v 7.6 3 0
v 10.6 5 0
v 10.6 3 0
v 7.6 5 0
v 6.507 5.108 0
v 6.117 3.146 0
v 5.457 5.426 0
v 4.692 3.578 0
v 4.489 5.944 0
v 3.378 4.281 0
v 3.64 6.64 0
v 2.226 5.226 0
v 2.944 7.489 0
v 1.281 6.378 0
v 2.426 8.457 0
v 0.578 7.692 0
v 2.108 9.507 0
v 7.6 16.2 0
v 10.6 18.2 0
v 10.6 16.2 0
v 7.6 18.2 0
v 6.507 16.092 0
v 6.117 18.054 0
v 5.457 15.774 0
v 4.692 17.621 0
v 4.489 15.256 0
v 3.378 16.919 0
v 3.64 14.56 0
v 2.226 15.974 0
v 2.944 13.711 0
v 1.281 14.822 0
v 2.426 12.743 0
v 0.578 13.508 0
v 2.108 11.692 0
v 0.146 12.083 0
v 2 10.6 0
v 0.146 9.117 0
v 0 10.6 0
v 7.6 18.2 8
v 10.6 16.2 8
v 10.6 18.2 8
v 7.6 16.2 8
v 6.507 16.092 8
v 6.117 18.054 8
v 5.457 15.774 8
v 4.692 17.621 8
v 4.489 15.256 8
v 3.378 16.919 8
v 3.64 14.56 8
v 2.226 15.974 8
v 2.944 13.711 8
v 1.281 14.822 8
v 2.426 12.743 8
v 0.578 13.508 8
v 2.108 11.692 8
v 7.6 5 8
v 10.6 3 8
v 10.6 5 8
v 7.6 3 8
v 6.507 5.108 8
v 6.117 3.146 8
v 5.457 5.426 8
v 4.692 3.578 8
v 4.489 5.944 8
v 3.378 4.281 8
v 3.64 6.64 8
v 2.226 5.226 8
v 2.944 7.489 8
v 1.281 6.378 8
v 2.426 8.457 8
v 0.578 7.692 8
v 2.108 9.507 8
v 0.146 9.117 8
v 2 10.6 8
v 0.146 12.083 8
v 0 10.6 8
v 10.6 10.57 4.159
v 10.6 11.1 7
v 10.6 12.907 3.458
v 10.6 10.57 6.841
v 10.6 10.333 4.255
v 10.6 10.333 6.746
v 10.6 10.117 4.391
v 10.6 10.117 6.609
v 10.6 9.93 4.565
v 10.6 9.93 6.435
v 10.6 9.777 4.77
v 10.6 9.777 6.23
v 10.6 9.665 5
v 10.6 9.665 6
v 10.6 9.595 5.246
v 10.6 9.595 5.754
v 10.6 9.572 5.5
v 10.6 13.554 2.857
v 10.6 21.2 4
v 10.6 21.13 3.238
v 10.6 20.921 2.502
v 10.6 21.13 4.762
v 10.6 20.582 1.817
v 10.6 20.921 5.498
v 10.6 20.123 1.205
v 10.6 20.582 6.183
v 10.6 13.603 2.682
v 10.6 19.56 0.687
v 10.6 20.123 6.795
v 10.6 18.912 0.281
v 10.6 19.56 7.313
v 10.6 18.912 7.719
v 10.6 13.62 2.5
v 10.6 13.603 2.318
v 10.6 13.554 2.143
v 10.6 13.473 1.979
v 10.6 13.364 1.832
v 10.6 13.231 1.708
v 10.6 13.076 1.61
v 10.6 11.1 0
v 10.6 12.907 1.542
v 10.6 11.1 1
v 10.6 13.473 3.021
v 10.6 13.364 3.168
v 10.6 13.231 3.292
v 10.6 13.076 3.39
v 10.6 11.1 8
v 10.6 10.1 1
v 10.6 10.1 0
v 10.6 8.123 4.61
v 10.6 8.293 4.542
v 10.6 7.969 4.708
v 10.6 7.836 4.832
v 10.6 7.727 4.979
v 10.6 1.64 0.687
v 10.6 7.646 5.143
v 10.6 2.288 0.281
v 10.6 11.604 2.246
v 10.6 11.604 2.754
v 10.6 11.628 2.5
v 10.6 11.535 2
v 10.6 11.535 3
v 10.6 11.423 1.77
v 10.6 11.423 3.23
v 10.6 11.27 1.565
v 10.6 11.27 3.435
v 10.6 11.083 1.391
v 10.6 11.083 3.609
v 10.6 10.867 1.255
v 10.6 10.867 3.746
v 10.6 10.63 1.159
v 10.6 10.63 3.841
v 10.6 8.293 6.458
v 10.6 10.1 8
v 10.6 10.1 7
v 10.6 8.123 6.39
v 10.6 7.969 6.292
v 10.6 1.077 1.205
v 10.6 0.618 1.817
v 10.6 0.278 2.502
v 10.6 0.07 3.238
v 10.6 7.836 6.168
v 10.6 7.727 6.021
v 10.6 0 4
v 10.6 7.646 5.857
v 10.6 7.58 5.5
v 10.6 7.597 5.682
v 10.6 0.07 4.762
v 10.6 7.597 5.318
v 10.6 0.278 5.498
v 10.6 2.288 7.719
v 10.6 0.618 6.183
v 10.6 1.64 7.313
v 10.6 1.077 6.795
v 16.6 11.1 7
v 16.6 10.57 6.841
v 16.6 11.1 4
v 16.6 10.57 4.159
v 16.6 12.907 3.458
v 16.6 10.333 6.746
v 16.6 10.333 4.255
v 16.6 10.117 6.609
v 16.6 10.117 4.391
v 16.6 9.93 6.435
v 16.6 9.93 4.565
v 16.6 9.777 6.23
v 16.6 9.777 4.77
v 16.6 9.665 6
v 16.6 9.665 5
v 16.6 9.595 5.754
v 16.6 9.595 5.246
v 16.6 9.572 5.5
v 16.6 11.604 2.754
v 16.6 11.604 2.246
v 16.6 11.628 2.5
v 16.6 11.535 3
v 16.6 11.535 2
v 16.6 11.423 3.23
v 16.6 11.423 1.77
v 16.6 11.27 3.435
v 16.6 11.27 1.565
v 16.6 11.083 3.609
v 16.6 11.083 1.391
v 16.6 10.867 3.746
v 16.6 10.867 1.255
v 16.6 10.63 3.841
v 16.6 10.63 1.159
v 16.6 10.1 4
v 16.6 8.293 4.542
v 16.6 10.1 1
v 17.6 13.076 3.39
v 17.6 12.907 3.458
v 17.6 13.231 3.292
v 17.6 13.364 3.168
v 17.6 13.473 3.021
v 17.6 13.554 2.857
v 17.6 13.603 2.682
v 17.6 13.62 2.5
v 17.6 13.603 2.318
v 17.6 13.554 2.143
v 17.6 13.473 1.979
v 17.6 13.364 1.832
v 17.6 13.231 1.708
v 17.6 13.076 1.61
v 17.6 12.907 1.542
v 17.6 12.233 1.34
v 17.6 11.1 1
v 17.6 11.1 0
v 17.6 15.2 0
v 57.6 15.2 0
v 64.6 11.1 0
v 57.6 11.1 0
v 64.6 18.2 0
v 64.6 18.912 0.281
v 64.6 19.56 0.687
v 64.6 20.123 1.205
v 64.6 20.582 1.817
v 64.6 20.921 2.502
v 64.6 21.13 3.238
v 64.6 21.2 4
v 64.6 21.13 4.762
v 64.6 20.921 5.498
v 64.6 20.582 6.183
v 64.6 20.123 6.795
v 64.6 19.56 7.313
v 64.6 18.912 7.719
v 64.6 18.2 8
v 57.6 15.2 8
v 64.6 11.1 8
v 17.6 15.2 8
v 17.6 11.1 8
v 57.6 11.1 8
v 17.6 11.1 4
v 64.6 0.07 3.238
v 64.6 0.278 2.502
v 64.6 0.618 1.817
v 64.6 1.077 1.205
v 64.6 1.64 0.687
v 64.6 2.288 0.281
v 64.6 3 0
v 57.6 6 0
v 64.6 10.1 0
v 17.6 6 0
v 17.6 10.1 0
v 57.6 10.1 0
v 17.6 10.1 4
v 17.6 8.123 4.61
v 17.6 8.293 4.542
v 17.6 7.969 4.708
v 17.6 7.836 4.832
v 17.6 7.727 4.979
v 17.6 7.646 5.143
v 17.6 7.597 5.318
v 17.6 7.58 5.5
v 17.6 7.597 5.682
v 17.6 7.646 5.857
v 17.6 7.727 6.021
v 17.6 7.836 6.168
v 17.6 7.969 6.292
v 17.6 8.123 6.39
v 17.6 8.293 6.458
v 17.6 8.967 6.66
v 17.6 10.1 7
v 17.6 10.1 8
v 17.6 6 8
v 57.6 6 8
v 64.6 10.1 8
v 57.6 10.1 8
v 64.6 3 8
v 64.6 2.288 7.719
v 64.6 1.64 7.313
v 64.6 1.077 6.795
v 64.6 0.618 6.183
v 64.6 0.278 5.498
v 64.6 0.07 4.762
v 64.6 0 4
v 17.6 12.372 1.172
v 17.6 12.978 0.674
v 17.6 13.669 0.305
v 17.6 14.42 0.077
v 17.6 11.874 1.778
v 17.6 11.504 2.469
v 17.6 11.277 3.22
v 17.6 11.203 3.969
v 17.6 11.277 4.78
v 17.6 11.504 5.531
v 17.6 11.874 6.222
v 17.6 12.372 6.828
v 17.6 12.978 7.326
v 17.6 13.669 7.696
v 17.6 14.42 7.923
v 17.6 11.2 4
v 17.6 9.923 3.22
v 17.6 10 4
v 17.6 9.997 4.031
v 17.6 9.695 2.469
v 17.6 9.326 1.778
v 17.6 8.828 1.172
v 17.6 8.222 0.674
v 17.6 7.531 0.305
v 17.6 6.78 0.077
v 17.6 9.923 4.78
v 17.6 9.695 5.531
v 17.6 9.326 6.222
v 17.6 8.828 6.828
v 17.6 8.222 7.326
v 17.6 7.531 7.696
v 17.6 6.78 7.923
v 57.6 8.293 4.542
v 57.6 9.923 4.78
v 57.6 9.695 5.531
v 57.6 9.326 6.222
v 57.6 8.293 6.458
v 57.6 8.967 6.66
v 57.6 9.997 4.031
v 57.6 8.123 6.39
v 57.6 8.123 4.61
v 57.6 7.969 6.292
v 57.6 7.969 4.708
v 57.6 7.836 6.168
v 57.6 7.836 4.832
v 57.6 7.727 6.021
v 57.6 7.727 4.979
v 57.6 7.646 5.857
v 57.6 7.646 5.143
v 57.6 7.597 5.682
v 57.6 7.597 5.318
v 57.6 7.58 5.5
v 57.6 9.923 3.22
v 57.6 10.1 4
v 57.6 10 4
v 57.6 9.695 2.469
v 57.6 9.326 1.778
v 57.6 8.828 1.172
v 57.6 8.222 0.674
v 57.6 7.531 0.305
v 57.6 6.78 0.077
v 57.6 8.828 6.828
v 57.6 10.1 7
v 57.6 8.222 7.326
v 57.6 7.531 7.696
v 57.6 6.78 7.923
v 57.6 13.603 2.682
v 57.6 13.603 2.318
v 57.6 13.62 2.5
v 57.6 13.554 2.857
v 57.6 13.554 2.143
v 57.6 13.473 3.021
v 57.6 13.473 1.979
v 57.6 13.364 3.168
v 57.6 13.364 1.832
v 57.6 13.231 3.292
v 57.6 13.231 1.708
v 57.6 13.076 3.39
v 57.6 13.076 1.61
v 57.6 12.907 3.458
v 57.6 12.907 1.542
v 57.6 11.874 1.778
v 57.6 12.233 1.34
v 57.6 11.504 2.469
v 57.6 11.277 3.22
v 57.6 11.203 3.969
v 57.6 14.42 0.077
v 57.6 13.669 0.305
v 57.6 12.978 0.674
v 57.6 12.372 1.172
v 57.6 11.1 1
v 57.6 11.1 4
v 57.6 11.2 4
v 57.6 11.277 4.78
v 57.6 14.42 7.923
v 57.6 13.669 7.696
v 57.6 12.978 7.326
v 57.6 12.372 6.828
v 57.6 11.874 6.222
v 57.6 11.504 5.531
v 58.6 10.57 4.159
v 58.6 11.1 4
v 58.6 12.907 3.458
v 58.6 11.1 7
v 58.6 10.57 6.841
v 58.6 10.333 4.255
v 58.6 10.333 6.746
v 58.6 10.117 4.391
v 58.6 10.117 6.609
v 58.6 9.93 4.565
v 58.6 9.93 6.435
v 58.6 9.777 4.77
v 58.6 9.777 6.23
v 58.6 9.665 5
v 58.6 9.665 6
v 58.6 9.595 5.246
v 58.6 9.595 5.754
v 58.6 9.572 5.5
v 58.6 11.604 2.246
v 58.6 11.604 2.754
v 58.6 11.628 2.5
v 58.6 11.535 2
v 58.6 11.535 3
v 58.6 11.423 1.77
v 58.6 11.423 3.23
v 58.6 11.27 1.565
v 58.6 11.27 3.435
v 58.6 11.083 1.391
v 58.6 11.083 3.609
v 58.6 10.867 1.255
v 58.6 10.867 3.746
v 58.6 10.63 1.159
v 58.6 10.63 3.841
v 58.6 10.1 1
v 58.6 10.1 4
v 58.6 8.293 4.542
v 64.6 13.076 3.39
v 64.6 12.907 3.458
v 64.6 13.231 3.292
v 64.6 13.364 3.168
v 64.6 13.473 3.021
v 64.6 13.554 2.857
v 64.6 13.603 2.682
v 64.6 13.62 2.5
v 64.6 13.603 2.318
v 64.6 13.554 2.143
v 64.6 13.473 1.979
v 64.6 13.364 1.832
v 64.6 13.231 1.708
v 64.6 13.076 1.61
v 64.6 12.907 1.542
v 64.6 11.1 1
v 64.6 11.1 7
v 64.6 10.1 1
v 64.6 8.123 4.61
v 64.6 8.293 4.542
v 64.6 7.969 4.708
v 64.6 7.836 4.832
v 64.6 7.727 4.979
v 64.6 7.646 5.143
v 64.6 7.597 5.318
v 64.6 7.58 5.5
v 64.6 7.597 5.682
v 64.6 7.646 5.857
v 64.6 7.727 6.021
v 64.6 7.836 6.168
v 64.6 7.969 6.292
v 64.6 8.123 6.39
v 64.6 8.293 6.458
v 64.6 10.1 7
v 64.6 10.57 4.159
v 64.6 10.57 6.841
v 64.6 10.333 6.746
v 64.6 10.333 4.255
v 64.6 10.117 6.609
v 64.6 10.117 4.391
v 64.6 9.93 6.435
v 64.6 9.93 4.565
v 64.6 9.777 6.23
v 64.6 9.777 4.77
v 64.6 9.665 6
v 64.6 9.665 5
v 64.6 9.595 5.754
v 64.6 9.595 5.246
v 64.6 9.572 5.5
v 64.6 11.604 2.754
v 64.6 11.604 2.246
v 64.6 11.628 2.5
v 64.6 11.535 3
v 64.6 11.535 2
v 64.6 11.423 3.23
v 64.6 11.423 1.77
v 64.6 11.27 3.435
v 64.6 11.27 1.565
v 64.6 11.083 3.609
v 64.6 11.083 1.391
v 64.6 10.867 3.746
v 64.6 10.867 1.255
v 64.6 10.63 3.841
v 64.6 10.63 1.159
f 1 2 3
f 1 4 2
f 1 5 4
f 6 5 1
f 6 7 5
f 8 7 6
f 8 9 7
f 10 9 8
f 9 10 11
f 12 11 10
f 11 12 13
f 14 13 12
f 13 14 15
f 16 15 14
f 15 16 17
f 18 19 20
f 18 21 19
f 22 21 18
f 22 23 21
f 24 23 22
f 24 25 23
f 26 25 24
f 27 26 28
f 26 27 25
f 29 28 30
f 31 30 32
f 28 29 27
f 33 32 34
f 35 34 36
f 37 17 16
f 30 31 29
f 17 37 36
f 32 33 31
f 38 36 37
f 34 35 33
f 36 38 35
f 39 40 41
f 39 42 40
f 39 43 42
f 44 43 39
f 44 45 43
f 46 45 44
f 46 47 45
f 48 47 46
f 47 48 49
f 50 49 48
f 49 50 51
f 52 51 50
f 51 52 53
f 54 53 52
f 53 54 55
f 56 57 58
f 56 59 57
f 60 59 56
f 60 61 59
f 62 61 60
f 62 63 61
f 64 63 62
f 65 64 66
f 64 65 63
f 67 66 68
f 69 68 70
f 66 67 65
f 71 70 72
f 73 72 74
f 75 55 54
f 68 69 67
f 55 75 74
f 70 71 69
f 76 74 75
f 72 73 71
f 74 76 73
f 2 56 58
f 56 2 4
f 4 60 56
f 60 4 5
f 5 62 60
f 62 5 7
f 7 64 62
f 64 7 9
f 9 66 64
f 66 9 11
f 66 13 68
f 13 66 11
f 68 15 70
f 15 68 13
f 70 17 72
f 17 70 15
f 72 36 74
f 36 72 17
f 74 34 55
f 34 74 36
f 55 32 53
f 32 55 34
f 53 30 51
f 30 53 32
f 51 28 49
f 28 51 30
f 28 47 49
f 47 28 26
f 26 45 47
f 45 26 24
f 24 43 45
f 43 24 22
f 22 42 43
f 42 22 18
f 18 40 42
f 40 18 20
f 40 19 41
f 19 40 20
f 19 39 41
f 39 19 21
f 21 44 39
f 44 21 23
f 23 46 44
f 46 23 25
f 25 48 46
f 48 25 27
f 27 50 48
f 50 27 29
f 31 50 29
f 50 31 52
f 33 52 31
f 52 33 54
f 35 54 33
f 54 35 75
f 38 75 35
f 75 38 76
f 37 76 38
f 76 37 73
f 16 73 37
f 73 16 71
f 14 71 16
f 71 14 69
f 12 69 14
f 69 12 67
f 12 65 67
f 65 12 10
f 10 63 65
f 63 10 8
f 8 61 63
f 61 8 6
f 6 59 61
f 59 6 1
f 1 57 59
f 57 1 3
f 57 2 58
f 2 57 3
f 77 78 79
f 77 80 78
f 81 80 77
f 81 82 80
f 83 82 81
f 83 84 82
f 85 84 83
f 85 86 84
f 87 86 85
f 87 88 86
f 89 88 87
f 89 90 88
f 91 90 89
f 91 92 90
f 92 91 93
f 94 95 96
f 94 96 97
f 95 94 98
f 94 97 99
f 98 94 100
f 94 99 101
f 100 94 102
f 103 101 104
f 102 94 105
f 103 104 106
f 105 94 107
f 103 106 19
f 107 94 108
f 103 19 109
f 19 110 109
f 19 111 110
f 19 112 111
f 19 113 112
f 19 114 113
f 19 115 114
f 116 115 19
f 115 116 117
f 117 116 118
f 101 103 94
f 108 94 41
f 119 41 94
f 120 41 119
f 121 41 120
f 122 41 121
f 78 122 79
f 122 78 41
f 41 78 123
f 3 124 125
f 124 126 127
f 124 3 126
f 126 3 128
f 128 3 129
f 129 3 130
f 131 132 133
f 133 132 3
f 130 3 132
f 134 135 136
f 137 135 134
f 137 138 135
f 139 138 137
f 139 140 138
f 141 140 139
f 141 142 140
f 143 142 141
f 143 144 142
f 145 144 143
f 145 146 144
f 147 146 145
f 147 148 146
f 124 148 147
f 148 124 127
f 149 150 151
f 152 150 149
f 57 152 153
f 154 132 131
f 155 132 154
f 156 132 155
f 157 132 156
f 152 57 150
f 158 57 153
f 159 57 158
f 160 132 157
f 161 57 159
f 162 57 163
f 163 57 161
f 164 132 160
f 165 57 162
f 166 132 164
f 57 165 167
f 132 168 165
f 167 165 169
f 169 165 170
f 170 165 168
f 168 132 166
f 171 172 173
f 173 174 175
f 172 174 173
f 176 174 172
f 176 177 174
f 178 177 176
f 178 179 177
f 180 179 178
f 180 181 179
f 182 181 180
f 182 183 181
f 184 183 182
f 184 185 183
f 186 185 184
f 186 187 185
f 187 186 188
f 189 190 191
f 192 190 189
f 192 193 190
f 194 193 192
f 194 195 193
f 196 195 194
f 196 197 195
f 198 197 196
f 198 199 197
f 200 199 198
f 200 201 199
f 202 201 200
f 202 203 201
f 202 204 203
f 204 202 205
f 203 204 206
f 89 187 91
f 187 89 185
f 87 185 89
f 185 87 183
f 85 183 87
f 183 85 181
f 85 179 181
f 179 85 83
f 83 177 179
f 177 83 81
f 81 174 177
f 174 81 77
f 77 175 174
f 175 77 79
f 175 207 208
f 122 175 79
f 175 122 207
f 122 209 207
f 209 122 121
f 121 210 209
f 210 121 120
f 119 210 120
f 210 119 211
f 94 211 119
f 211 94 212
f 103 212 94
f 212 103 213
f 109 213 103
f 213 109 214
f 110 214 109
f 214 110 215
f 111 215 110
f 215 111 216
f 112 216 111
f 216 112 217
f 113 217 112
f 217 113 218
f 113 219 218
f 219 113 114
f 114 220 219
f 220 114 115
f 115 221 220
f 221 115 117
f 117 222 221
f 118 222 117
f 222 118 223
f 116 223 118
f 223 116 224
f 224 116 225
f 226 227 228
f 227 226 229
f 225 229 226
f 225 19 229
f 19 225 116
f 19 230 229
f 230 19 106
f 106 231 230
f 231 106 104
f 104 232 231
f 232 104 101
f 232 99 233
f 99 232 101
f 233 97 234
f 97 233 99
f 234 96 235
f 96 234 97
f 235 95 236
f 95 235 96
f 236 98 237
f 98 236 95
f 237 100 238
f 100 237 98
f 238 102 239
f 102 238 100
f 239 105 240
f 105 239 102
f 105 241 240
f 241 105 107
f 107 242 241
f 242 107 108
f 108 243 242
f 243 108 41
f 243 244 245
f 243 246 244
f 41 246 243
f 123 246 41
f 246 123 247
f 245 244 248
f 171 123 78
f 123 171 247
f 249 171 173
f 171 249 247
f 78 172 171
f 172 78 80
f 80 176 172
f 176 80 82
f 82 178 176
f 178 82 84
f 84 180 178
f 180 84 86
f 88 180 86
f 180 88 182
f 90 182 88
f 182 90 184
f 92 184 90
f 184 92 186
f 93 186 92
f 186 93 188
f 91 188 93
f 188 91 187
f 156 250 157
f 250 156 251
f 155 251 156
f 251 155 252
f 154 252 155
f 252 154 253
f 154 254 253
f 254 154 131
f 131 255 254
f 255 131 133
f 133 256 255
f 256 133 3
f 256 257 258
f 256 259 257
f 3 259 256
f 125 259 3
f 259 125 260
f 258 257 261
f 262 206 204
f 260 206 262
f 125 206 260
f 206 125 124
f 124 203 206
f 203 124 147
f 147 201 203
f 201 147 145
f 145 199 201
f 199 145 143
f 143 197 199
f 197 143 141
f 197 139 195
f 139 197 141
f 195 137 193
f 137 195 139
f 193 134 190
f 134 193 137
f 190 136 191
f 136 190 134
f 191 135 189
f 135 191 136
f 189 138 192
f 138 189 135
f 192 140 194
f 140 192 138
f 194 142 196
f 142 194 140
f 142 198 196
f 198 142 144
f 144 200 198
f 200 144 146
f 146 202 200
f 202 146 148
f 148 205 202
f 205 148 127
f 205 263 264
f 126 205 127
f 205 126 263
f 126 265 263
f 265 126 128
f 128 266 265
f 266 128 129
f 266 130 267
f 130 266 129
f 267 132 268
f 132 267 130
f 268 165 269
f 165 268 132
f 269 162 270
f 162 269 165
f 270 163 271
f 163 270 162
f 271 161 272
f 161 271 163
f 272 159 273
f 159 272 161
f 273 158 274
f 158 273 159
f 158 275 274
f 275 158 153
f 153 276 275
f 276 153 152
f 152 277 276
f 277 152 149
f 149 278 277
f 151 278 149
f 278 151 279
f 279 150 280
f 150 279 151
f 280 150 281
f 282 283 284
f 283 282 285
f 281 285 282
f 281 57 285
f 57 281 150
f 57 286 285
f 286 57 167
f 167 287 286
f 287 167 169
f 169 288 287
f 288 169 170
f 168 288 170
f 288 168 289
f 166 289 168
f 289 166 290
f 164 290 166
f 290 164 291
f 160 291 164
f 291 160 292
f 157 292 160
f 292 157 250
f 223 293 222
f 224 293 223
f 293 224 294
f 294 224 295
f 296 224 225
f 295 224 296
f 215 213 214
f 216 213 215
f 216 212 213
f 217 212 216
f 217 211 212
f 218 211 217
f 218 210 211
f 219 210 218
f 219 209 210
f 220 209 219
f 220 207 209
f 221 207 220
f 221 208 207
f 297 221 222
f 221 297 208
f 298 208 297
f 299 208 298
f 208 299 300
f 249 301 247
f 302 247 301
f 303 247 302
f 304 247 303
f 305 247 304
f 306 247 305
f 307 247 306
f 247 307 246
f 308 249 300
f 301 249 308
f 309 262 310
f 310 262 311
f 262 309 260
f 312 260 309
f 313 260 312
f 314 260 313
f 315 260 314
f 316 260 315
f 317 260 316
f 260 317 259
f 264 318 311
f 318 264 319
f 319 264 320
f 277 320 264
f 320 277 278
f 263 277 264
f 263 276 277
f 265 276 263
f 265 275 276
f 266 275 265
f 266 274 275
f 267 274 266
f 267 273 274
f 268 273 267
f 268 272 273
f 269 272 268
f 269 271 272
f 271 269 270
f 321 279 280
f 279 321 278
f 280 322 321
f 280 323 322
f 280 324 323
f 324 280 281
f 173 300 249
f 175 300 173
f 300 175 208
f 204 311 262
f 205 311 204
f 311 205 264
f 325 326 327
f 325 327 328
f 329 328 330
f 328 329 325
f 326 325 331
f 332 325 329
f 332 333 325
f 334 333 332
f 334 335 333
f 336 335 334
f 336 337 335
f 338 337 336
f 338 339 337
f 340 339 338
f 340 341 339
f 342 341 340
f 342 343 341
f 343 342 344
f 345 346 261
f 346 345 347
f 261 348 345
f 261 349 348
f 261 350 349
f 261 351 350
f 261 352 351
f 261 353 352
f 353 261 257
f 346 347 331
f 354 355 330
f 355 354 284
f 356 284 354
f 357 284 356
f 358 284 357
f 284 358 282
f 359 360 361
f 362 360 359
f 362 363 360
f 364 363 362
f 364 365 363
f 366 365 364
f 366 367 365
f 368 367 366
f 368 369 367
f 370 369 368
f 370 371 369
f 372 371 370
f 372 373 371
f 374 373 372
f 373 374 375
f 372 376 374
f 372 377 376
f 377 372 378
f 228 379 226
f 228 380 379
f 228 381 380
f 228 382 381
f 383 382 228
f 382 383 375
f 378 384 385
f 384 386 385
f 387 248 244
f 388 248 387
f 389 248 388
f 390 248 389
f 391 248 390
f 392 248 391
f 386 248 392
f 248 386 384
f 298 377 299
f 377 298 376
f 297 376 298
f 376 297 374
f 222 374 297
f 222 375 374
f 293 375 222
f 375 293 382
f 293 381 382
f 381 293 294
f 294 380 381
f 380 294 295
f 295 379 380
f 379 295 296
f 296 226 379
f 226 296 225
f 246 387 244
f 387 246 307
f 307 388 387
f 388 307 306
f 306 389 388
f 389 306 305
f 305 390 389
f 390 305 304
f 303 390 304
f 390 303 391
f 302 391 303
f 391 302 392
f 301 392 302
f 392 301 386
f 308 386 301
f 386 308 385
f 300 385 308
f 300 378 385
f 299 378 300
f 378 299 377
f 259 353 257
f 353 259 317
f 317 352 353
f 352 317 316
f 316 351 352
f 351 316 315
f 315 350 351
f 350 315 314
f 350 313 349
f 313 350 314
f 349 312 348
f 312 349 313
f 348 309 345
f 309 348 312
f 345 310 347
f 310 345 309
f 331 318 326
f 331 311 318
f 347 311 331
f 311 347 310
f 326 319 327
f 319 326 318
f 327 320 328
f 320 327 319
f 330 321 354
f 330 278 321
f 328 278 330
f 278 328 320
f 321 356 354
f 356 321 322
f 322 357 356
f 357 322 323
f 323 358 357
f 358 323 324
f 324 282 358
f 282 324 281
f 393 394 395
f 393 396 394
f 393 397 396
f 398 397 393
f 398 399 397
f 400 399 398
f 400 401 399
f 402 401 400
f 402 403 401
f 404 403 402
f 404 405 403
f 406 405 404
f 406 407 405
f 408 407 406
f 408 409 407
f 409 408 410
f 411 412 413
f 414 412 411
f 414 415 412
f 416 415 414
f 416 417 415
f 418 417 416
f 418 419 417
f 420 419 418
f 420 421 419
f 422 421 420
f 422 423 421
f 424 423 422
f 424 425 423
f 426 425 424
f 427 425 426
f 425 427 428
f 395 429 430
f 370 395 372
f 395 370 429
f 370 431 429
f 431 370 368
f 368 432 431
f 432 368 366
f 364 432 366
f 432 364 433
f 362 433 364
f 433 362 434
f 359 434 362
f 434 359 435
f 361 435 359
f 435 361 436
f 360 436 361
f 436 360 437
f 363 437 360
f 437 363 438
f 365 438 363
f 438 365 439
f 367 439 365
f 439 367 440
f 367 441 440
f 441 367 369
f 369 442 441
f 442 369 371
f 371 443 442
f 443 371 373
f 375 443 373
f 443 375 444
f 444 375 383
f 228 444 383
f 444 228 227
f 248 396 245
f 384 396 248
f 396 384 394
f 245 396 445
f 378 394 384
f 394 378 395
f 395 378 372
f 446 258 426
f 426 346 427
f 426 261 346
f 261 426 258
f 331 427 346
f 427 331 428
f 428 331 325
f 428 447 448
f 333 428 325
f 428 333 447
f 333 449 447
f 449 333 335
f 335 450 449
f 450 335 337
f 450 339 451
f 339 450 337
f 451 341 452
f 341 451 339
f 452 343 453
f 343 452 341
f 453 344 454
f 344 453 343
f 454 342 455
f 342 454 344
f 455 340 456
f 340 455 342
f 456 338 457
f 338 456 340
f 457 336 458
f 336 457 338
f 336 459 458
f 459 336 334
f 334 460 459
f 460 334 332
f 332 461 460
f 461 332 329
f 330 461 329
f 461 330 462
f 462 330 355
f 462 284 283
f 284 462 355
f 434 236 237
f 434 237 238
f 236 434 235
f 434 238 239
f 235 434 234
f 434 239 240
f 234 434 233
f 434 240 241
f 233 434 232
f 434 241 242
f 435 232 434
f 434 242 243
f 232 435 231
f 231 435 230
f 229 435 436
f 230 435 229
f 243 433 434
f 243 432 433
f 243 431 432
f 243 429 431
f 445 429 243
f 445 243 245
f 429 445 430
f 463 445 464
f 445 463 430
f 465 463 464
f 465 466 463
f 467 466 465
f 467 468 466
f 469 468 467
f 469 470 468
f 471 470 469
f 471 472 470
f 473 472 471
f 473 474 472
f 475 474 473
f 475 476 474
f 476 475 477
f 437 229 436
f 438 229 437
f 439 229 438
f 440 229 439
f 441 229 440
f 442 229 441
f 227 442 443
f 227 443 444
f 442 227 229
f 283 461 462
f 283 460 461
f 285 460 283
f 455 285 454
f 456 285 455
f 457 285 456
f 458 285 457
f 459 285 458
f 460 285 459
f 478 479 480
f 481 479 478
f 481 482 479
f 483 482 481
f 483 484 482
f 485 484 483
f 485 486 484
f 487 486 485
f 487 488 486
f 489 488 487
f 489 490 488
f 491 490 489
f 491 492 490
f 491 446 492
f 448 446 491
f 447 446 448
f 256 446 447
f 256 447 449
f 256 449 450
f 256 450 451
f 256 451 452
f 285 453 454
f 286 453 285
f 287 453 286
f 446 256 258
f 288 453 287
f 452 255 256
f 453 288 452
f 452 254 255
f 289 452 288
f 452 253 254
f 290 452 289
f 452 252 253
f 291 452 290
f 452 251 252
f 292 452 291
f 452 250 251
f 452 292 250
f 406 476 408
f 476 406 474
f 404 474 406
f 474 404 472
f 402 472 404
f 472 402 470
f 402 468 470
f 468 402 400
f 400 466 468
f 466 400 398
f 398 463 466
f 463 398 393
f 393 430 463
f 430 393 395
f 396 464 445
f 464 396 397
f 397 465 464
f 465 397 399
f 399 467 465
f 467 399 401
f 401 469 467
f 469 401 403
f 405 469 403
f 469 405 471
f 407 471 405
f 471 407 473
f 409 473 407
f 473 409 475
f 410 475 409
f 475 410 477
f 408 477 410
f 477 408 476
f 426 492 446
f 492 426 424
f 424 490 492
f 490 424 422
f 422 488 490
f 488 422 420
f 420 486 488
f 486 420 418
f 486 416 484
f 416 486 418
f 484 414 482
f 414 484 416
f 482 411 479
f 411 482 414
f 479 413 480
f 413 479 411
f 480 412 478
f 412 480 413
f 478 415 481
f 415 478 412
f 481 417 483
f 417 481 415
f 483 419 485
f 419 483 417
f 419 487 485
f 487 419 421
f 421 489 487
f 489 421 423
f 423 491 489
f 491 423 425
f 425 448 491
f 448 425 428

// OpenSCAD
// Generated by Parametrix
ca_pastePusher_faceFace_000 = [ [ 10.6000, 3.0000 ],[ 10.6000, 5.0000 ],[ 7.6000, 5.0000 ],[ 6.5075, 5.1076 ],[ 5.4570, 5.4263 ],[ 4.4888, 5.9438 ],[ 3.6402, 6.6402 ],[ 2.9438, 7.4888 ],[ 2.4263, 8.4570 ],[ 2.1076, 9.5075 ],[ 2.0000, 10.6000 ],[ 2.1076, 11.6925 ],[ 2.4263, 12.7430 ],[ 2.9438, 13.7112 ],[ 3.6402, 14.5598 ],[ 4.4888, 15.2562 ],[ 5.4570, 15.7737 ],[ 6.5075, 16.0924 ],[ 7.6000, 16.2000 ],[ 10.6000, 16.2000 ],[ 10.6000, 18.2000 ],[ 7.6000, 18.2000 ],[ 6.1173, 18.0540 ],[ 4.6916, 17.6215 ],[ 3.3777, 16.9192 ],[ 2.2260, 15.9740 ],[ 1.2808, 14.8223 ],[ 0.5785, 13.5084 ],[ 0.1460, 12.0827 ],[ 0.0000, 10.6000 ],[ 0.1460, 9.1173 ],[ 0.5785, 7.6916 ],[ 1.2808, 6.3777 ],[ 2.2260, 5.2260 ],[ 3.3777, 4.2808 ],[ 4.6916, 3.5785 ],[ 6.1173, 3.1460 ],[ 7.6000, 3.0000 ],[ 10.6000, 3.0000 ] ];
cb_pastePusher_faceFace_000 = [  0, 1, 2, 3, 4, 5, 6, 7, 8, 9, 10, 11, 12, 13, 14, 15, 16, 17, 18, 19, 20, 21, 22, 23, 24, 25, 26, 27, 28, 29, 30, 31, 32, 33, 34, 35, 36, 37, 38 ];
a_pastePusher_faceFace = concat(ca_pastePusher_faceFace_000);
b_pastePusher_faceFace = [cb_pastePusher_faceFace_000];
ca_pastePusher_faceMid_000 = [ [ 0.0000, 3.0000 ],[ 0.2807, 2.2884 ],[ 0.6868, 1.6401 ],[ 1.2046, 1.0769 ],[ 1.8166, 0.6179 ],[ 2.5021, 0.2785 ],[ 3.2382, 0.0702 ],[ 4.0000, 0.0000 ],[ 4.7618, 0.0702 ],[ 5.4979, 0.2785 ],[ 6.1834, 0.6179 ],[ 6.7954, 1.0769 ],[ 7.3132, 1.6401 ],[ 7.7193, 2.2884 ],[ 8.0000, 3.0000 ],[ 8.0000, 6.0000 ],[ 7.9231, 6.7804 ],[ 7.6955, 7.5307 ],[ 7.3259, 8.2223 ],[ 6.8284, 8.8284 ],[ 6.2223, 9.3259 ],[ 5.5307, 9.6955 ],[ 4.7804, 9.9231 ],[ 4.0000, 10.0000 ],[ 3.2196, 9.9231 ],[ 2.4693, 9.6955 ],[ 1.7777, 9.3259 ],[ 1.1716, 8.8284 ],[ 0.6741, 8.2223 ],[ 0.3045, 7.5307 ],[ 0.0769, 6.7804 ],[ 0.0000, 6.0000 ],[ 0.0000, 3.0000 ] ];
cb_pastePusher_faceMid_000 = [  0, 1, 2, 3, 4, 5, 6, 7, 8, 9, 10, 11, 12, 13, 14, 15, 16, 17, 18, 19, 20, 21, 22, 23, 24, 25, 26, 27, 28, 29, 30, 31, 32 ];
ca_pastePusher_faceMid_001 = [ [ 0.0000, 18.2000 ],[ 0.2807, 18.9116 ],[ 0.6868, 19.5599 ],[ 1.2046, 20.1231 ],[ 1.8166, 20.5821 ],[ 2.5021, 20.9215 ],[ 3.2382, 21.1298 ],[ 4.0000, 21.2000 ],[ 4.7618, 21.1298 ],[ 5.4979, 20.9215 ],[ 6.1834, 20.5821 ],[ 6.7954, 20.1231 ],[ 7.3132, 19.5599 ],[ 7.7193, 18.9116 ],[ 8.0000, 18.2000 ],[ 8.0000, 15.2000 ],[ 7.9231, 14.4196 ],[ 7.6955, 13.6693 ],[ 7.3259, 12.9777 ],[ 6.8284, 12.3716 ],[ 6.2223, 11.8741 ],[ 5.5307, 11.5045 ],[ 4.7804, 11.2769 ],[ 4.0000, 11.2000 ],[ 3.2196, 11.2769 ],[ 2.4693, 11.5045 ],[ 1.7777, 11.8741 ],[ 1.1716, 12.3716 ],[ 0.6741, 12.9777 ],[ 0.3045, 13.6693 ],[ 0.0769, 14.4196 ],[ 0.0000, 15.2000 ],[ 0.0000, 18.2000 ] ];
cb_pastePusher_faceMid_001 = [  33, 34, 35, 36, 37, 38, 39, 40, 41, 42, 43, 44, 45, 46, 47, 48, 49, 50, 51, 52, 53, 54, 55, 56, 57, 58, 59, 60, 61, 62, 63, 64, 65 ];
a_pastePusher_faceMid = concat(ca_pastePusher_faceMid_000, ca_pastePusher_faceMid_001);
b_pastePusher_faceMid = [cb_pastePusher_faceMid_000, cb_pastePusher_faceMid_001];
ca_pastePusher_faceSide_000 = [ [ 0.0000, 3.0000 ],[ 0.2807, 2.2884 ],[ 0.6868, 1.6401 ],[ 1.2046, 1.0769 ],[ 1.8166, 0.6179 ],[ 2.5021, 0.2785 ],[ 3.2382, 0.0702 ],[ 4.0000, 0.0000 ],[ 4.7618, 0.0702 ],[ 5.4979, 0.2785 ],[ 6.1834, 0.6179 ],[ 6.7954, 1.0769 ],[ 7.3132, 1.6401 ],[ 7.7193, 2.2884 ],[ 8.0000, 3.0000 ],[ 8.0000, 10.1000 ],[ 7.0000, 10.1000 ],[ 6.8410, 10.6301 ],[ 6.7455, 10.8672 ],[ 6.6086, 11.0829 ],[ 6.4347, 11.2701 ],[ 6.2297, 11.4226 ],[ 6.0004, 11.5354 ],[ 5.7544, 11.6045 ],[ 5.5000, 11.6279 ],[ 5.2456, 11.6045 ],[ 4.9996, 11.5354 ],[ 4.7703, 11.4226 ],[ 4.5653, 11.2701 ],[ 4.3914, 11.0829 ],[ 4.2545, 10.8672 ],[ 4.1590, 10.6301 ],[ 3.4578, 8.2928 ],[ 3.3896, 8.1235 ],[ 3.2918, 7.9694 ],[ 3.1677, 7.8356 ],[ 3.0212, 7.7267 ],[ 2.8574, 7.6462 ],[ 2.6817, 7.5968 ],[ 2.5000, 7.5801 ],[ 2.3183, 7.5968 ],[ 2.1426, 7.6462 ],[ 1.9788, 7.7267 ],[ 1.8323, 7.8356 ],[ 1.7082, 7.9694 ],[ 1.6104, 8.1235 ],[ 1.5422, 8.2928 ],[ 1.0000, 10.1000 ],[ 0.0000, 10.1000 ],[ 0.0000, 3.0000 ] ];
cb_pastePusher_faceSide_000 = [  0, 1, 2, 3, 4, 5, 6, 7, 8, 9, 10, 11, 12, 13, 14, 15, 16, 17, 18, 19, 20, 21, 22, 23, 24, 25, 26, 27, 28, 29, 30, 31, 32, 33, 34, 35, 36, 37, 38, 39, 40, 41, 42, 43, 44, 45, 46, 47, 48, 49 ];
ca_pastePusher_faceSide_001 = [ [ 0.0000, 18.2000 ],[ 0.2807, 18.9116 ],[ 0.6868, 19.5599 ],[ 1.2046, 20.1231 ],[ 1.8166, 20.5821 ],[ 2.5021, 20.9215 ],[ 3.2382, 21.1298 ],[ 4.0000, 21.2000 ],[ 4.7618, 21.1298 ],[ 5.4979, 20.9215 ],[ 6.1834, 20.5821 ],[ 6.7954, 20.1231 ],[ 7.3132, 19.5599 ],[ 7.7193, 18.9116 ],[ 8.0000, 18.2000 ],[ 8.0000, 11.1000 ],[ 7.0000, 11.1000 ],[ 6.4578, 12.9072 ],[ 6.3896, 13.0765 ],[ 6.2918, 13.2306 ],[ 6.1677, 13.3644 ],[ 6.0212, 13.4733 ],[ 5.8574, 13.5538 ],[ 5.6817, 13.6032 ],[ 5.5000, 13.6199 ],[ 5.3183, 13.6032 ],[ 5.1426, 13.5538 ],[ 4.9788, 13.4733 ],[ 4.8323, 13.3644 ],[ 4.7082, 13.2306 ],[ 4.6104, 13.0765 ],[ 4.5422, 12.9072 ],[ 3.8410, 10.5699 ],[ 3.7455, 10.3328 ],[ 3.6086, 10.1171 ],[ 3.4347, 9.9299 ],[ 3.2297, 9.7774 ],[ 3.0004, 9.6646 ],[ 2.7544, 9.5955 ],[ 2.5000, 9.5721 ],[ 2.2456, 9.5955 ],[ 1.9996, 9.6646 ],[ 1.7703, 9.7774 ],[ 1.5653, 9.9299 ],[ 1.3914, 10.1171 ],[ 1.2545, 10.3328 ],[ 1.1590, 10.5699 ],[ 1.0000, 11.1000 ],[ 0.0000, 11.1000 ],[ 0.0000, 18.2000 ] ];
cb_pastePusher_faceSide_001 = [  50, 51, 52, 53, 54, 55, 56, 57, 58, 59, 60, 61, 62, 63, 64, 65, 66, 67, 68, 69, 70, 71, 72, 73, 74, 75, 76, 77, 78, 79, 80, 81, 82, 83, 84, 85, 86, 87, 88, 89, 90, 91, 92, 93, 94, 95, 96, 97, 98, 99 ];
a_pastePusher_faceSide = concat(ca_pastePusher_faceSide_000, ca_pastePusher_faceSide_001);
b_pastePusher_faceSide = [cb_pastePusher_faceSide_000, cb_pastePusher_faceSide_001];
ca_pastePusher_faceSideB_000 = [ [ 0.0000, 3.0000 ],[ 0.2807, 2.2884 ],[ 0.6868, 1.6401 ],[ 1.2046, 1.0769 ],[ 1.8166, 0.6179 ],[ 2.5021, 0.2785 ],[ 3.2382, 0.0702 ],[ 4.0000, 0.0000 ],[ 4.7618, 0.0702 ],[ 5.4979, 0.2785 ],[ 6.1834, 0.6179 ],[ 6.7954, 1.0769 ],[ 7.3132, 1.6401 ],[ 7.7193, 2.2884 ],[ 8.0000, 3.0000 ],[ 8.0000, 10.1000 ],[ 4.0000, 10.1000 ],[ 3.4578, 8.2928 ],[ 3.3896, 8.1235 ],[ 3.2918, 7.9694 ],[ 3.1677, 7.8356 ],[ 3.0212, 7.7267 ],[ 2.8574, 7.6462 ],[ 2.6817, 7.5968 ],[ 2.5000, 7.5801 ],[ 2.3183, 7.5968 ],[ 2.1426, 7.6462 ],[ 1.9788, 7.7267 ],[ 1.8323, 7.8356 ],[ 1.7082, 7.9694 ],[ 1.6104, 8.1235 ],[ 1.5422, 8.2928 ],[ 1.0000, 10.1000 ],[ 0.0000, 10.1000 ],[ 0.0000, 3.0000 ] ];
cb_pastePusher_faceSideB_000 = [  0, 1, 2, 3, 4, 5, 6, 7, 8, 9, 10, 11, 12, 13, 14, 15, 16, 17, 18, 19, 20, 21, 22, 23, 24, 25, 26, 27, 28, 29, 30, 31, 32, 33, 34 ];
ca_pastePusher_faceSideB_001 = [ [ 0.0000, 18.2000 ],[ 0.2807, 18.9116 ],[ 0.6868, 19.5599 ],[ 1.2046, 20.1231 ],[ 1.8166, 20.5821 ],[ 2.5021, 20.9215 ],[ 3.2382, 21.1298 ],[ 4.0000, 21.2000 ],[ 4.7618, 21.1298 ],[ 5.4979, 20.9215 ],[ 6.1834, 20.5821 ],[ 6.7954, 20.1231 ],[ 7.3132, 19.5599 ],[ 7.7193, 18.9116 ],[ 8.0000, 18.2000 ],[ 8.0000, 11.1000 ],[ 7.0000, 11.1000 ],[ 6.4578, 12.9072 ],[ 6.3896, 13.0765 ],[ 6.2918, 13.2306 ],[ 6.1677, 13.3644 ],[ 6.0212, 13.4733 ],[ 5.8574, 13.5538 ],[ 5.6817, 13.6032 ],[ 5.5000, 13.6199 ],[ 5.3183, 13.6032 ],[ 5.1426, 13.5538 ],[ 4.9788, 13.4733 ],[ 4.8323, 13.3644 ],[ 4.7082, 13.2306 ],[ 4.6104, 13.0765 ],[ 4.5422, 12.9072 ],[ 4.0000, 11.1000 ],[ 0.0000, 11.1000 ],[ 0.0000, 18.2000 ] ];
cb_pastePusher_faceSideB_001 = [  35, 36, 37, 38, 39, 40, 41, 42, 43, 44, 45, 46, 47, 48, 49, 50, 51, 52, 53, 54, 55, 56, 57, 58, 59, 60, 61, 62, 63, 64, 65, 66, 67, 68, 69 ];
a_pastePusher_faceSideB = concat(ca_pastePusher_faceSideB_000, ca_pastePusher_faceSideB_001);
b_pastePusher_faceSideB = [cb_pastePusher_faceSideB_000, cb_pastePusher_faceSideB_001];

module subpax_pastePusher_face () {
	translate( [ 0, 0, 0 ])
		rotate( [ 0, 0, 0 ])
			   linear_extrude(height = 8) polygon(a_pastePusher_faceFace, b_pastePusher_faceFace);
}

module subpax_pastePusher_b1 () {
	translate( [ 10.6, 0, 8 ])
		rotate( [ 0, 90, 0 ])
			   linear_extrude(height = 6) polygon(a_pastePusher_faceSide, b_pastePusher_faceSide);
}

module subpax_pastePusher_b2 () {
	translate( [ 16.6, 0, 8 ])
		rotate( [ 0, 90, 0 ])
			   linear_extrude(height = 1) polygon(a_pastePusher_faceSideB, b_pastePusher_faceSideB);
}

module subpax_pastePusher_b3 () {
	translate( [ 17.6, 0, 8 ])
		rotate( [ 0, 90, 0 ])
			   linear_extrude(height = 40) polygon(a_pastePusher_faceMid, b_pastePusher_faceMid);
}

module subpax_pastePusher_b4 () {
	translate( [ 57.6, 0, 8 ])
		rotate( [ 0, 90, 0 ])
			   linear_extrude(height = 1) polygon(a_pastePusher_faceSideB, b_pastePusher_faceSideB);
}

module subpax_pastePusher_b5 () {
	translate( [ 58.6, 0, 8 ])
		rotate( [ 0, 90, 0 ])
			   linear_extrude(height = 6) polygon(a_pastePusher_faceSide, b_pastePusher_faceSide);
}

module pax_pastePusher () {
	union () {
		subpax_pastePusher_face();
subpax_pastePusher_b1();
subpax_pastePusher_b2();
subpax_pastePusher_b3();
subpax_pastePusher_b4();
subpax_pastePusher_b5();
	}
}

pax_pastePusher();
